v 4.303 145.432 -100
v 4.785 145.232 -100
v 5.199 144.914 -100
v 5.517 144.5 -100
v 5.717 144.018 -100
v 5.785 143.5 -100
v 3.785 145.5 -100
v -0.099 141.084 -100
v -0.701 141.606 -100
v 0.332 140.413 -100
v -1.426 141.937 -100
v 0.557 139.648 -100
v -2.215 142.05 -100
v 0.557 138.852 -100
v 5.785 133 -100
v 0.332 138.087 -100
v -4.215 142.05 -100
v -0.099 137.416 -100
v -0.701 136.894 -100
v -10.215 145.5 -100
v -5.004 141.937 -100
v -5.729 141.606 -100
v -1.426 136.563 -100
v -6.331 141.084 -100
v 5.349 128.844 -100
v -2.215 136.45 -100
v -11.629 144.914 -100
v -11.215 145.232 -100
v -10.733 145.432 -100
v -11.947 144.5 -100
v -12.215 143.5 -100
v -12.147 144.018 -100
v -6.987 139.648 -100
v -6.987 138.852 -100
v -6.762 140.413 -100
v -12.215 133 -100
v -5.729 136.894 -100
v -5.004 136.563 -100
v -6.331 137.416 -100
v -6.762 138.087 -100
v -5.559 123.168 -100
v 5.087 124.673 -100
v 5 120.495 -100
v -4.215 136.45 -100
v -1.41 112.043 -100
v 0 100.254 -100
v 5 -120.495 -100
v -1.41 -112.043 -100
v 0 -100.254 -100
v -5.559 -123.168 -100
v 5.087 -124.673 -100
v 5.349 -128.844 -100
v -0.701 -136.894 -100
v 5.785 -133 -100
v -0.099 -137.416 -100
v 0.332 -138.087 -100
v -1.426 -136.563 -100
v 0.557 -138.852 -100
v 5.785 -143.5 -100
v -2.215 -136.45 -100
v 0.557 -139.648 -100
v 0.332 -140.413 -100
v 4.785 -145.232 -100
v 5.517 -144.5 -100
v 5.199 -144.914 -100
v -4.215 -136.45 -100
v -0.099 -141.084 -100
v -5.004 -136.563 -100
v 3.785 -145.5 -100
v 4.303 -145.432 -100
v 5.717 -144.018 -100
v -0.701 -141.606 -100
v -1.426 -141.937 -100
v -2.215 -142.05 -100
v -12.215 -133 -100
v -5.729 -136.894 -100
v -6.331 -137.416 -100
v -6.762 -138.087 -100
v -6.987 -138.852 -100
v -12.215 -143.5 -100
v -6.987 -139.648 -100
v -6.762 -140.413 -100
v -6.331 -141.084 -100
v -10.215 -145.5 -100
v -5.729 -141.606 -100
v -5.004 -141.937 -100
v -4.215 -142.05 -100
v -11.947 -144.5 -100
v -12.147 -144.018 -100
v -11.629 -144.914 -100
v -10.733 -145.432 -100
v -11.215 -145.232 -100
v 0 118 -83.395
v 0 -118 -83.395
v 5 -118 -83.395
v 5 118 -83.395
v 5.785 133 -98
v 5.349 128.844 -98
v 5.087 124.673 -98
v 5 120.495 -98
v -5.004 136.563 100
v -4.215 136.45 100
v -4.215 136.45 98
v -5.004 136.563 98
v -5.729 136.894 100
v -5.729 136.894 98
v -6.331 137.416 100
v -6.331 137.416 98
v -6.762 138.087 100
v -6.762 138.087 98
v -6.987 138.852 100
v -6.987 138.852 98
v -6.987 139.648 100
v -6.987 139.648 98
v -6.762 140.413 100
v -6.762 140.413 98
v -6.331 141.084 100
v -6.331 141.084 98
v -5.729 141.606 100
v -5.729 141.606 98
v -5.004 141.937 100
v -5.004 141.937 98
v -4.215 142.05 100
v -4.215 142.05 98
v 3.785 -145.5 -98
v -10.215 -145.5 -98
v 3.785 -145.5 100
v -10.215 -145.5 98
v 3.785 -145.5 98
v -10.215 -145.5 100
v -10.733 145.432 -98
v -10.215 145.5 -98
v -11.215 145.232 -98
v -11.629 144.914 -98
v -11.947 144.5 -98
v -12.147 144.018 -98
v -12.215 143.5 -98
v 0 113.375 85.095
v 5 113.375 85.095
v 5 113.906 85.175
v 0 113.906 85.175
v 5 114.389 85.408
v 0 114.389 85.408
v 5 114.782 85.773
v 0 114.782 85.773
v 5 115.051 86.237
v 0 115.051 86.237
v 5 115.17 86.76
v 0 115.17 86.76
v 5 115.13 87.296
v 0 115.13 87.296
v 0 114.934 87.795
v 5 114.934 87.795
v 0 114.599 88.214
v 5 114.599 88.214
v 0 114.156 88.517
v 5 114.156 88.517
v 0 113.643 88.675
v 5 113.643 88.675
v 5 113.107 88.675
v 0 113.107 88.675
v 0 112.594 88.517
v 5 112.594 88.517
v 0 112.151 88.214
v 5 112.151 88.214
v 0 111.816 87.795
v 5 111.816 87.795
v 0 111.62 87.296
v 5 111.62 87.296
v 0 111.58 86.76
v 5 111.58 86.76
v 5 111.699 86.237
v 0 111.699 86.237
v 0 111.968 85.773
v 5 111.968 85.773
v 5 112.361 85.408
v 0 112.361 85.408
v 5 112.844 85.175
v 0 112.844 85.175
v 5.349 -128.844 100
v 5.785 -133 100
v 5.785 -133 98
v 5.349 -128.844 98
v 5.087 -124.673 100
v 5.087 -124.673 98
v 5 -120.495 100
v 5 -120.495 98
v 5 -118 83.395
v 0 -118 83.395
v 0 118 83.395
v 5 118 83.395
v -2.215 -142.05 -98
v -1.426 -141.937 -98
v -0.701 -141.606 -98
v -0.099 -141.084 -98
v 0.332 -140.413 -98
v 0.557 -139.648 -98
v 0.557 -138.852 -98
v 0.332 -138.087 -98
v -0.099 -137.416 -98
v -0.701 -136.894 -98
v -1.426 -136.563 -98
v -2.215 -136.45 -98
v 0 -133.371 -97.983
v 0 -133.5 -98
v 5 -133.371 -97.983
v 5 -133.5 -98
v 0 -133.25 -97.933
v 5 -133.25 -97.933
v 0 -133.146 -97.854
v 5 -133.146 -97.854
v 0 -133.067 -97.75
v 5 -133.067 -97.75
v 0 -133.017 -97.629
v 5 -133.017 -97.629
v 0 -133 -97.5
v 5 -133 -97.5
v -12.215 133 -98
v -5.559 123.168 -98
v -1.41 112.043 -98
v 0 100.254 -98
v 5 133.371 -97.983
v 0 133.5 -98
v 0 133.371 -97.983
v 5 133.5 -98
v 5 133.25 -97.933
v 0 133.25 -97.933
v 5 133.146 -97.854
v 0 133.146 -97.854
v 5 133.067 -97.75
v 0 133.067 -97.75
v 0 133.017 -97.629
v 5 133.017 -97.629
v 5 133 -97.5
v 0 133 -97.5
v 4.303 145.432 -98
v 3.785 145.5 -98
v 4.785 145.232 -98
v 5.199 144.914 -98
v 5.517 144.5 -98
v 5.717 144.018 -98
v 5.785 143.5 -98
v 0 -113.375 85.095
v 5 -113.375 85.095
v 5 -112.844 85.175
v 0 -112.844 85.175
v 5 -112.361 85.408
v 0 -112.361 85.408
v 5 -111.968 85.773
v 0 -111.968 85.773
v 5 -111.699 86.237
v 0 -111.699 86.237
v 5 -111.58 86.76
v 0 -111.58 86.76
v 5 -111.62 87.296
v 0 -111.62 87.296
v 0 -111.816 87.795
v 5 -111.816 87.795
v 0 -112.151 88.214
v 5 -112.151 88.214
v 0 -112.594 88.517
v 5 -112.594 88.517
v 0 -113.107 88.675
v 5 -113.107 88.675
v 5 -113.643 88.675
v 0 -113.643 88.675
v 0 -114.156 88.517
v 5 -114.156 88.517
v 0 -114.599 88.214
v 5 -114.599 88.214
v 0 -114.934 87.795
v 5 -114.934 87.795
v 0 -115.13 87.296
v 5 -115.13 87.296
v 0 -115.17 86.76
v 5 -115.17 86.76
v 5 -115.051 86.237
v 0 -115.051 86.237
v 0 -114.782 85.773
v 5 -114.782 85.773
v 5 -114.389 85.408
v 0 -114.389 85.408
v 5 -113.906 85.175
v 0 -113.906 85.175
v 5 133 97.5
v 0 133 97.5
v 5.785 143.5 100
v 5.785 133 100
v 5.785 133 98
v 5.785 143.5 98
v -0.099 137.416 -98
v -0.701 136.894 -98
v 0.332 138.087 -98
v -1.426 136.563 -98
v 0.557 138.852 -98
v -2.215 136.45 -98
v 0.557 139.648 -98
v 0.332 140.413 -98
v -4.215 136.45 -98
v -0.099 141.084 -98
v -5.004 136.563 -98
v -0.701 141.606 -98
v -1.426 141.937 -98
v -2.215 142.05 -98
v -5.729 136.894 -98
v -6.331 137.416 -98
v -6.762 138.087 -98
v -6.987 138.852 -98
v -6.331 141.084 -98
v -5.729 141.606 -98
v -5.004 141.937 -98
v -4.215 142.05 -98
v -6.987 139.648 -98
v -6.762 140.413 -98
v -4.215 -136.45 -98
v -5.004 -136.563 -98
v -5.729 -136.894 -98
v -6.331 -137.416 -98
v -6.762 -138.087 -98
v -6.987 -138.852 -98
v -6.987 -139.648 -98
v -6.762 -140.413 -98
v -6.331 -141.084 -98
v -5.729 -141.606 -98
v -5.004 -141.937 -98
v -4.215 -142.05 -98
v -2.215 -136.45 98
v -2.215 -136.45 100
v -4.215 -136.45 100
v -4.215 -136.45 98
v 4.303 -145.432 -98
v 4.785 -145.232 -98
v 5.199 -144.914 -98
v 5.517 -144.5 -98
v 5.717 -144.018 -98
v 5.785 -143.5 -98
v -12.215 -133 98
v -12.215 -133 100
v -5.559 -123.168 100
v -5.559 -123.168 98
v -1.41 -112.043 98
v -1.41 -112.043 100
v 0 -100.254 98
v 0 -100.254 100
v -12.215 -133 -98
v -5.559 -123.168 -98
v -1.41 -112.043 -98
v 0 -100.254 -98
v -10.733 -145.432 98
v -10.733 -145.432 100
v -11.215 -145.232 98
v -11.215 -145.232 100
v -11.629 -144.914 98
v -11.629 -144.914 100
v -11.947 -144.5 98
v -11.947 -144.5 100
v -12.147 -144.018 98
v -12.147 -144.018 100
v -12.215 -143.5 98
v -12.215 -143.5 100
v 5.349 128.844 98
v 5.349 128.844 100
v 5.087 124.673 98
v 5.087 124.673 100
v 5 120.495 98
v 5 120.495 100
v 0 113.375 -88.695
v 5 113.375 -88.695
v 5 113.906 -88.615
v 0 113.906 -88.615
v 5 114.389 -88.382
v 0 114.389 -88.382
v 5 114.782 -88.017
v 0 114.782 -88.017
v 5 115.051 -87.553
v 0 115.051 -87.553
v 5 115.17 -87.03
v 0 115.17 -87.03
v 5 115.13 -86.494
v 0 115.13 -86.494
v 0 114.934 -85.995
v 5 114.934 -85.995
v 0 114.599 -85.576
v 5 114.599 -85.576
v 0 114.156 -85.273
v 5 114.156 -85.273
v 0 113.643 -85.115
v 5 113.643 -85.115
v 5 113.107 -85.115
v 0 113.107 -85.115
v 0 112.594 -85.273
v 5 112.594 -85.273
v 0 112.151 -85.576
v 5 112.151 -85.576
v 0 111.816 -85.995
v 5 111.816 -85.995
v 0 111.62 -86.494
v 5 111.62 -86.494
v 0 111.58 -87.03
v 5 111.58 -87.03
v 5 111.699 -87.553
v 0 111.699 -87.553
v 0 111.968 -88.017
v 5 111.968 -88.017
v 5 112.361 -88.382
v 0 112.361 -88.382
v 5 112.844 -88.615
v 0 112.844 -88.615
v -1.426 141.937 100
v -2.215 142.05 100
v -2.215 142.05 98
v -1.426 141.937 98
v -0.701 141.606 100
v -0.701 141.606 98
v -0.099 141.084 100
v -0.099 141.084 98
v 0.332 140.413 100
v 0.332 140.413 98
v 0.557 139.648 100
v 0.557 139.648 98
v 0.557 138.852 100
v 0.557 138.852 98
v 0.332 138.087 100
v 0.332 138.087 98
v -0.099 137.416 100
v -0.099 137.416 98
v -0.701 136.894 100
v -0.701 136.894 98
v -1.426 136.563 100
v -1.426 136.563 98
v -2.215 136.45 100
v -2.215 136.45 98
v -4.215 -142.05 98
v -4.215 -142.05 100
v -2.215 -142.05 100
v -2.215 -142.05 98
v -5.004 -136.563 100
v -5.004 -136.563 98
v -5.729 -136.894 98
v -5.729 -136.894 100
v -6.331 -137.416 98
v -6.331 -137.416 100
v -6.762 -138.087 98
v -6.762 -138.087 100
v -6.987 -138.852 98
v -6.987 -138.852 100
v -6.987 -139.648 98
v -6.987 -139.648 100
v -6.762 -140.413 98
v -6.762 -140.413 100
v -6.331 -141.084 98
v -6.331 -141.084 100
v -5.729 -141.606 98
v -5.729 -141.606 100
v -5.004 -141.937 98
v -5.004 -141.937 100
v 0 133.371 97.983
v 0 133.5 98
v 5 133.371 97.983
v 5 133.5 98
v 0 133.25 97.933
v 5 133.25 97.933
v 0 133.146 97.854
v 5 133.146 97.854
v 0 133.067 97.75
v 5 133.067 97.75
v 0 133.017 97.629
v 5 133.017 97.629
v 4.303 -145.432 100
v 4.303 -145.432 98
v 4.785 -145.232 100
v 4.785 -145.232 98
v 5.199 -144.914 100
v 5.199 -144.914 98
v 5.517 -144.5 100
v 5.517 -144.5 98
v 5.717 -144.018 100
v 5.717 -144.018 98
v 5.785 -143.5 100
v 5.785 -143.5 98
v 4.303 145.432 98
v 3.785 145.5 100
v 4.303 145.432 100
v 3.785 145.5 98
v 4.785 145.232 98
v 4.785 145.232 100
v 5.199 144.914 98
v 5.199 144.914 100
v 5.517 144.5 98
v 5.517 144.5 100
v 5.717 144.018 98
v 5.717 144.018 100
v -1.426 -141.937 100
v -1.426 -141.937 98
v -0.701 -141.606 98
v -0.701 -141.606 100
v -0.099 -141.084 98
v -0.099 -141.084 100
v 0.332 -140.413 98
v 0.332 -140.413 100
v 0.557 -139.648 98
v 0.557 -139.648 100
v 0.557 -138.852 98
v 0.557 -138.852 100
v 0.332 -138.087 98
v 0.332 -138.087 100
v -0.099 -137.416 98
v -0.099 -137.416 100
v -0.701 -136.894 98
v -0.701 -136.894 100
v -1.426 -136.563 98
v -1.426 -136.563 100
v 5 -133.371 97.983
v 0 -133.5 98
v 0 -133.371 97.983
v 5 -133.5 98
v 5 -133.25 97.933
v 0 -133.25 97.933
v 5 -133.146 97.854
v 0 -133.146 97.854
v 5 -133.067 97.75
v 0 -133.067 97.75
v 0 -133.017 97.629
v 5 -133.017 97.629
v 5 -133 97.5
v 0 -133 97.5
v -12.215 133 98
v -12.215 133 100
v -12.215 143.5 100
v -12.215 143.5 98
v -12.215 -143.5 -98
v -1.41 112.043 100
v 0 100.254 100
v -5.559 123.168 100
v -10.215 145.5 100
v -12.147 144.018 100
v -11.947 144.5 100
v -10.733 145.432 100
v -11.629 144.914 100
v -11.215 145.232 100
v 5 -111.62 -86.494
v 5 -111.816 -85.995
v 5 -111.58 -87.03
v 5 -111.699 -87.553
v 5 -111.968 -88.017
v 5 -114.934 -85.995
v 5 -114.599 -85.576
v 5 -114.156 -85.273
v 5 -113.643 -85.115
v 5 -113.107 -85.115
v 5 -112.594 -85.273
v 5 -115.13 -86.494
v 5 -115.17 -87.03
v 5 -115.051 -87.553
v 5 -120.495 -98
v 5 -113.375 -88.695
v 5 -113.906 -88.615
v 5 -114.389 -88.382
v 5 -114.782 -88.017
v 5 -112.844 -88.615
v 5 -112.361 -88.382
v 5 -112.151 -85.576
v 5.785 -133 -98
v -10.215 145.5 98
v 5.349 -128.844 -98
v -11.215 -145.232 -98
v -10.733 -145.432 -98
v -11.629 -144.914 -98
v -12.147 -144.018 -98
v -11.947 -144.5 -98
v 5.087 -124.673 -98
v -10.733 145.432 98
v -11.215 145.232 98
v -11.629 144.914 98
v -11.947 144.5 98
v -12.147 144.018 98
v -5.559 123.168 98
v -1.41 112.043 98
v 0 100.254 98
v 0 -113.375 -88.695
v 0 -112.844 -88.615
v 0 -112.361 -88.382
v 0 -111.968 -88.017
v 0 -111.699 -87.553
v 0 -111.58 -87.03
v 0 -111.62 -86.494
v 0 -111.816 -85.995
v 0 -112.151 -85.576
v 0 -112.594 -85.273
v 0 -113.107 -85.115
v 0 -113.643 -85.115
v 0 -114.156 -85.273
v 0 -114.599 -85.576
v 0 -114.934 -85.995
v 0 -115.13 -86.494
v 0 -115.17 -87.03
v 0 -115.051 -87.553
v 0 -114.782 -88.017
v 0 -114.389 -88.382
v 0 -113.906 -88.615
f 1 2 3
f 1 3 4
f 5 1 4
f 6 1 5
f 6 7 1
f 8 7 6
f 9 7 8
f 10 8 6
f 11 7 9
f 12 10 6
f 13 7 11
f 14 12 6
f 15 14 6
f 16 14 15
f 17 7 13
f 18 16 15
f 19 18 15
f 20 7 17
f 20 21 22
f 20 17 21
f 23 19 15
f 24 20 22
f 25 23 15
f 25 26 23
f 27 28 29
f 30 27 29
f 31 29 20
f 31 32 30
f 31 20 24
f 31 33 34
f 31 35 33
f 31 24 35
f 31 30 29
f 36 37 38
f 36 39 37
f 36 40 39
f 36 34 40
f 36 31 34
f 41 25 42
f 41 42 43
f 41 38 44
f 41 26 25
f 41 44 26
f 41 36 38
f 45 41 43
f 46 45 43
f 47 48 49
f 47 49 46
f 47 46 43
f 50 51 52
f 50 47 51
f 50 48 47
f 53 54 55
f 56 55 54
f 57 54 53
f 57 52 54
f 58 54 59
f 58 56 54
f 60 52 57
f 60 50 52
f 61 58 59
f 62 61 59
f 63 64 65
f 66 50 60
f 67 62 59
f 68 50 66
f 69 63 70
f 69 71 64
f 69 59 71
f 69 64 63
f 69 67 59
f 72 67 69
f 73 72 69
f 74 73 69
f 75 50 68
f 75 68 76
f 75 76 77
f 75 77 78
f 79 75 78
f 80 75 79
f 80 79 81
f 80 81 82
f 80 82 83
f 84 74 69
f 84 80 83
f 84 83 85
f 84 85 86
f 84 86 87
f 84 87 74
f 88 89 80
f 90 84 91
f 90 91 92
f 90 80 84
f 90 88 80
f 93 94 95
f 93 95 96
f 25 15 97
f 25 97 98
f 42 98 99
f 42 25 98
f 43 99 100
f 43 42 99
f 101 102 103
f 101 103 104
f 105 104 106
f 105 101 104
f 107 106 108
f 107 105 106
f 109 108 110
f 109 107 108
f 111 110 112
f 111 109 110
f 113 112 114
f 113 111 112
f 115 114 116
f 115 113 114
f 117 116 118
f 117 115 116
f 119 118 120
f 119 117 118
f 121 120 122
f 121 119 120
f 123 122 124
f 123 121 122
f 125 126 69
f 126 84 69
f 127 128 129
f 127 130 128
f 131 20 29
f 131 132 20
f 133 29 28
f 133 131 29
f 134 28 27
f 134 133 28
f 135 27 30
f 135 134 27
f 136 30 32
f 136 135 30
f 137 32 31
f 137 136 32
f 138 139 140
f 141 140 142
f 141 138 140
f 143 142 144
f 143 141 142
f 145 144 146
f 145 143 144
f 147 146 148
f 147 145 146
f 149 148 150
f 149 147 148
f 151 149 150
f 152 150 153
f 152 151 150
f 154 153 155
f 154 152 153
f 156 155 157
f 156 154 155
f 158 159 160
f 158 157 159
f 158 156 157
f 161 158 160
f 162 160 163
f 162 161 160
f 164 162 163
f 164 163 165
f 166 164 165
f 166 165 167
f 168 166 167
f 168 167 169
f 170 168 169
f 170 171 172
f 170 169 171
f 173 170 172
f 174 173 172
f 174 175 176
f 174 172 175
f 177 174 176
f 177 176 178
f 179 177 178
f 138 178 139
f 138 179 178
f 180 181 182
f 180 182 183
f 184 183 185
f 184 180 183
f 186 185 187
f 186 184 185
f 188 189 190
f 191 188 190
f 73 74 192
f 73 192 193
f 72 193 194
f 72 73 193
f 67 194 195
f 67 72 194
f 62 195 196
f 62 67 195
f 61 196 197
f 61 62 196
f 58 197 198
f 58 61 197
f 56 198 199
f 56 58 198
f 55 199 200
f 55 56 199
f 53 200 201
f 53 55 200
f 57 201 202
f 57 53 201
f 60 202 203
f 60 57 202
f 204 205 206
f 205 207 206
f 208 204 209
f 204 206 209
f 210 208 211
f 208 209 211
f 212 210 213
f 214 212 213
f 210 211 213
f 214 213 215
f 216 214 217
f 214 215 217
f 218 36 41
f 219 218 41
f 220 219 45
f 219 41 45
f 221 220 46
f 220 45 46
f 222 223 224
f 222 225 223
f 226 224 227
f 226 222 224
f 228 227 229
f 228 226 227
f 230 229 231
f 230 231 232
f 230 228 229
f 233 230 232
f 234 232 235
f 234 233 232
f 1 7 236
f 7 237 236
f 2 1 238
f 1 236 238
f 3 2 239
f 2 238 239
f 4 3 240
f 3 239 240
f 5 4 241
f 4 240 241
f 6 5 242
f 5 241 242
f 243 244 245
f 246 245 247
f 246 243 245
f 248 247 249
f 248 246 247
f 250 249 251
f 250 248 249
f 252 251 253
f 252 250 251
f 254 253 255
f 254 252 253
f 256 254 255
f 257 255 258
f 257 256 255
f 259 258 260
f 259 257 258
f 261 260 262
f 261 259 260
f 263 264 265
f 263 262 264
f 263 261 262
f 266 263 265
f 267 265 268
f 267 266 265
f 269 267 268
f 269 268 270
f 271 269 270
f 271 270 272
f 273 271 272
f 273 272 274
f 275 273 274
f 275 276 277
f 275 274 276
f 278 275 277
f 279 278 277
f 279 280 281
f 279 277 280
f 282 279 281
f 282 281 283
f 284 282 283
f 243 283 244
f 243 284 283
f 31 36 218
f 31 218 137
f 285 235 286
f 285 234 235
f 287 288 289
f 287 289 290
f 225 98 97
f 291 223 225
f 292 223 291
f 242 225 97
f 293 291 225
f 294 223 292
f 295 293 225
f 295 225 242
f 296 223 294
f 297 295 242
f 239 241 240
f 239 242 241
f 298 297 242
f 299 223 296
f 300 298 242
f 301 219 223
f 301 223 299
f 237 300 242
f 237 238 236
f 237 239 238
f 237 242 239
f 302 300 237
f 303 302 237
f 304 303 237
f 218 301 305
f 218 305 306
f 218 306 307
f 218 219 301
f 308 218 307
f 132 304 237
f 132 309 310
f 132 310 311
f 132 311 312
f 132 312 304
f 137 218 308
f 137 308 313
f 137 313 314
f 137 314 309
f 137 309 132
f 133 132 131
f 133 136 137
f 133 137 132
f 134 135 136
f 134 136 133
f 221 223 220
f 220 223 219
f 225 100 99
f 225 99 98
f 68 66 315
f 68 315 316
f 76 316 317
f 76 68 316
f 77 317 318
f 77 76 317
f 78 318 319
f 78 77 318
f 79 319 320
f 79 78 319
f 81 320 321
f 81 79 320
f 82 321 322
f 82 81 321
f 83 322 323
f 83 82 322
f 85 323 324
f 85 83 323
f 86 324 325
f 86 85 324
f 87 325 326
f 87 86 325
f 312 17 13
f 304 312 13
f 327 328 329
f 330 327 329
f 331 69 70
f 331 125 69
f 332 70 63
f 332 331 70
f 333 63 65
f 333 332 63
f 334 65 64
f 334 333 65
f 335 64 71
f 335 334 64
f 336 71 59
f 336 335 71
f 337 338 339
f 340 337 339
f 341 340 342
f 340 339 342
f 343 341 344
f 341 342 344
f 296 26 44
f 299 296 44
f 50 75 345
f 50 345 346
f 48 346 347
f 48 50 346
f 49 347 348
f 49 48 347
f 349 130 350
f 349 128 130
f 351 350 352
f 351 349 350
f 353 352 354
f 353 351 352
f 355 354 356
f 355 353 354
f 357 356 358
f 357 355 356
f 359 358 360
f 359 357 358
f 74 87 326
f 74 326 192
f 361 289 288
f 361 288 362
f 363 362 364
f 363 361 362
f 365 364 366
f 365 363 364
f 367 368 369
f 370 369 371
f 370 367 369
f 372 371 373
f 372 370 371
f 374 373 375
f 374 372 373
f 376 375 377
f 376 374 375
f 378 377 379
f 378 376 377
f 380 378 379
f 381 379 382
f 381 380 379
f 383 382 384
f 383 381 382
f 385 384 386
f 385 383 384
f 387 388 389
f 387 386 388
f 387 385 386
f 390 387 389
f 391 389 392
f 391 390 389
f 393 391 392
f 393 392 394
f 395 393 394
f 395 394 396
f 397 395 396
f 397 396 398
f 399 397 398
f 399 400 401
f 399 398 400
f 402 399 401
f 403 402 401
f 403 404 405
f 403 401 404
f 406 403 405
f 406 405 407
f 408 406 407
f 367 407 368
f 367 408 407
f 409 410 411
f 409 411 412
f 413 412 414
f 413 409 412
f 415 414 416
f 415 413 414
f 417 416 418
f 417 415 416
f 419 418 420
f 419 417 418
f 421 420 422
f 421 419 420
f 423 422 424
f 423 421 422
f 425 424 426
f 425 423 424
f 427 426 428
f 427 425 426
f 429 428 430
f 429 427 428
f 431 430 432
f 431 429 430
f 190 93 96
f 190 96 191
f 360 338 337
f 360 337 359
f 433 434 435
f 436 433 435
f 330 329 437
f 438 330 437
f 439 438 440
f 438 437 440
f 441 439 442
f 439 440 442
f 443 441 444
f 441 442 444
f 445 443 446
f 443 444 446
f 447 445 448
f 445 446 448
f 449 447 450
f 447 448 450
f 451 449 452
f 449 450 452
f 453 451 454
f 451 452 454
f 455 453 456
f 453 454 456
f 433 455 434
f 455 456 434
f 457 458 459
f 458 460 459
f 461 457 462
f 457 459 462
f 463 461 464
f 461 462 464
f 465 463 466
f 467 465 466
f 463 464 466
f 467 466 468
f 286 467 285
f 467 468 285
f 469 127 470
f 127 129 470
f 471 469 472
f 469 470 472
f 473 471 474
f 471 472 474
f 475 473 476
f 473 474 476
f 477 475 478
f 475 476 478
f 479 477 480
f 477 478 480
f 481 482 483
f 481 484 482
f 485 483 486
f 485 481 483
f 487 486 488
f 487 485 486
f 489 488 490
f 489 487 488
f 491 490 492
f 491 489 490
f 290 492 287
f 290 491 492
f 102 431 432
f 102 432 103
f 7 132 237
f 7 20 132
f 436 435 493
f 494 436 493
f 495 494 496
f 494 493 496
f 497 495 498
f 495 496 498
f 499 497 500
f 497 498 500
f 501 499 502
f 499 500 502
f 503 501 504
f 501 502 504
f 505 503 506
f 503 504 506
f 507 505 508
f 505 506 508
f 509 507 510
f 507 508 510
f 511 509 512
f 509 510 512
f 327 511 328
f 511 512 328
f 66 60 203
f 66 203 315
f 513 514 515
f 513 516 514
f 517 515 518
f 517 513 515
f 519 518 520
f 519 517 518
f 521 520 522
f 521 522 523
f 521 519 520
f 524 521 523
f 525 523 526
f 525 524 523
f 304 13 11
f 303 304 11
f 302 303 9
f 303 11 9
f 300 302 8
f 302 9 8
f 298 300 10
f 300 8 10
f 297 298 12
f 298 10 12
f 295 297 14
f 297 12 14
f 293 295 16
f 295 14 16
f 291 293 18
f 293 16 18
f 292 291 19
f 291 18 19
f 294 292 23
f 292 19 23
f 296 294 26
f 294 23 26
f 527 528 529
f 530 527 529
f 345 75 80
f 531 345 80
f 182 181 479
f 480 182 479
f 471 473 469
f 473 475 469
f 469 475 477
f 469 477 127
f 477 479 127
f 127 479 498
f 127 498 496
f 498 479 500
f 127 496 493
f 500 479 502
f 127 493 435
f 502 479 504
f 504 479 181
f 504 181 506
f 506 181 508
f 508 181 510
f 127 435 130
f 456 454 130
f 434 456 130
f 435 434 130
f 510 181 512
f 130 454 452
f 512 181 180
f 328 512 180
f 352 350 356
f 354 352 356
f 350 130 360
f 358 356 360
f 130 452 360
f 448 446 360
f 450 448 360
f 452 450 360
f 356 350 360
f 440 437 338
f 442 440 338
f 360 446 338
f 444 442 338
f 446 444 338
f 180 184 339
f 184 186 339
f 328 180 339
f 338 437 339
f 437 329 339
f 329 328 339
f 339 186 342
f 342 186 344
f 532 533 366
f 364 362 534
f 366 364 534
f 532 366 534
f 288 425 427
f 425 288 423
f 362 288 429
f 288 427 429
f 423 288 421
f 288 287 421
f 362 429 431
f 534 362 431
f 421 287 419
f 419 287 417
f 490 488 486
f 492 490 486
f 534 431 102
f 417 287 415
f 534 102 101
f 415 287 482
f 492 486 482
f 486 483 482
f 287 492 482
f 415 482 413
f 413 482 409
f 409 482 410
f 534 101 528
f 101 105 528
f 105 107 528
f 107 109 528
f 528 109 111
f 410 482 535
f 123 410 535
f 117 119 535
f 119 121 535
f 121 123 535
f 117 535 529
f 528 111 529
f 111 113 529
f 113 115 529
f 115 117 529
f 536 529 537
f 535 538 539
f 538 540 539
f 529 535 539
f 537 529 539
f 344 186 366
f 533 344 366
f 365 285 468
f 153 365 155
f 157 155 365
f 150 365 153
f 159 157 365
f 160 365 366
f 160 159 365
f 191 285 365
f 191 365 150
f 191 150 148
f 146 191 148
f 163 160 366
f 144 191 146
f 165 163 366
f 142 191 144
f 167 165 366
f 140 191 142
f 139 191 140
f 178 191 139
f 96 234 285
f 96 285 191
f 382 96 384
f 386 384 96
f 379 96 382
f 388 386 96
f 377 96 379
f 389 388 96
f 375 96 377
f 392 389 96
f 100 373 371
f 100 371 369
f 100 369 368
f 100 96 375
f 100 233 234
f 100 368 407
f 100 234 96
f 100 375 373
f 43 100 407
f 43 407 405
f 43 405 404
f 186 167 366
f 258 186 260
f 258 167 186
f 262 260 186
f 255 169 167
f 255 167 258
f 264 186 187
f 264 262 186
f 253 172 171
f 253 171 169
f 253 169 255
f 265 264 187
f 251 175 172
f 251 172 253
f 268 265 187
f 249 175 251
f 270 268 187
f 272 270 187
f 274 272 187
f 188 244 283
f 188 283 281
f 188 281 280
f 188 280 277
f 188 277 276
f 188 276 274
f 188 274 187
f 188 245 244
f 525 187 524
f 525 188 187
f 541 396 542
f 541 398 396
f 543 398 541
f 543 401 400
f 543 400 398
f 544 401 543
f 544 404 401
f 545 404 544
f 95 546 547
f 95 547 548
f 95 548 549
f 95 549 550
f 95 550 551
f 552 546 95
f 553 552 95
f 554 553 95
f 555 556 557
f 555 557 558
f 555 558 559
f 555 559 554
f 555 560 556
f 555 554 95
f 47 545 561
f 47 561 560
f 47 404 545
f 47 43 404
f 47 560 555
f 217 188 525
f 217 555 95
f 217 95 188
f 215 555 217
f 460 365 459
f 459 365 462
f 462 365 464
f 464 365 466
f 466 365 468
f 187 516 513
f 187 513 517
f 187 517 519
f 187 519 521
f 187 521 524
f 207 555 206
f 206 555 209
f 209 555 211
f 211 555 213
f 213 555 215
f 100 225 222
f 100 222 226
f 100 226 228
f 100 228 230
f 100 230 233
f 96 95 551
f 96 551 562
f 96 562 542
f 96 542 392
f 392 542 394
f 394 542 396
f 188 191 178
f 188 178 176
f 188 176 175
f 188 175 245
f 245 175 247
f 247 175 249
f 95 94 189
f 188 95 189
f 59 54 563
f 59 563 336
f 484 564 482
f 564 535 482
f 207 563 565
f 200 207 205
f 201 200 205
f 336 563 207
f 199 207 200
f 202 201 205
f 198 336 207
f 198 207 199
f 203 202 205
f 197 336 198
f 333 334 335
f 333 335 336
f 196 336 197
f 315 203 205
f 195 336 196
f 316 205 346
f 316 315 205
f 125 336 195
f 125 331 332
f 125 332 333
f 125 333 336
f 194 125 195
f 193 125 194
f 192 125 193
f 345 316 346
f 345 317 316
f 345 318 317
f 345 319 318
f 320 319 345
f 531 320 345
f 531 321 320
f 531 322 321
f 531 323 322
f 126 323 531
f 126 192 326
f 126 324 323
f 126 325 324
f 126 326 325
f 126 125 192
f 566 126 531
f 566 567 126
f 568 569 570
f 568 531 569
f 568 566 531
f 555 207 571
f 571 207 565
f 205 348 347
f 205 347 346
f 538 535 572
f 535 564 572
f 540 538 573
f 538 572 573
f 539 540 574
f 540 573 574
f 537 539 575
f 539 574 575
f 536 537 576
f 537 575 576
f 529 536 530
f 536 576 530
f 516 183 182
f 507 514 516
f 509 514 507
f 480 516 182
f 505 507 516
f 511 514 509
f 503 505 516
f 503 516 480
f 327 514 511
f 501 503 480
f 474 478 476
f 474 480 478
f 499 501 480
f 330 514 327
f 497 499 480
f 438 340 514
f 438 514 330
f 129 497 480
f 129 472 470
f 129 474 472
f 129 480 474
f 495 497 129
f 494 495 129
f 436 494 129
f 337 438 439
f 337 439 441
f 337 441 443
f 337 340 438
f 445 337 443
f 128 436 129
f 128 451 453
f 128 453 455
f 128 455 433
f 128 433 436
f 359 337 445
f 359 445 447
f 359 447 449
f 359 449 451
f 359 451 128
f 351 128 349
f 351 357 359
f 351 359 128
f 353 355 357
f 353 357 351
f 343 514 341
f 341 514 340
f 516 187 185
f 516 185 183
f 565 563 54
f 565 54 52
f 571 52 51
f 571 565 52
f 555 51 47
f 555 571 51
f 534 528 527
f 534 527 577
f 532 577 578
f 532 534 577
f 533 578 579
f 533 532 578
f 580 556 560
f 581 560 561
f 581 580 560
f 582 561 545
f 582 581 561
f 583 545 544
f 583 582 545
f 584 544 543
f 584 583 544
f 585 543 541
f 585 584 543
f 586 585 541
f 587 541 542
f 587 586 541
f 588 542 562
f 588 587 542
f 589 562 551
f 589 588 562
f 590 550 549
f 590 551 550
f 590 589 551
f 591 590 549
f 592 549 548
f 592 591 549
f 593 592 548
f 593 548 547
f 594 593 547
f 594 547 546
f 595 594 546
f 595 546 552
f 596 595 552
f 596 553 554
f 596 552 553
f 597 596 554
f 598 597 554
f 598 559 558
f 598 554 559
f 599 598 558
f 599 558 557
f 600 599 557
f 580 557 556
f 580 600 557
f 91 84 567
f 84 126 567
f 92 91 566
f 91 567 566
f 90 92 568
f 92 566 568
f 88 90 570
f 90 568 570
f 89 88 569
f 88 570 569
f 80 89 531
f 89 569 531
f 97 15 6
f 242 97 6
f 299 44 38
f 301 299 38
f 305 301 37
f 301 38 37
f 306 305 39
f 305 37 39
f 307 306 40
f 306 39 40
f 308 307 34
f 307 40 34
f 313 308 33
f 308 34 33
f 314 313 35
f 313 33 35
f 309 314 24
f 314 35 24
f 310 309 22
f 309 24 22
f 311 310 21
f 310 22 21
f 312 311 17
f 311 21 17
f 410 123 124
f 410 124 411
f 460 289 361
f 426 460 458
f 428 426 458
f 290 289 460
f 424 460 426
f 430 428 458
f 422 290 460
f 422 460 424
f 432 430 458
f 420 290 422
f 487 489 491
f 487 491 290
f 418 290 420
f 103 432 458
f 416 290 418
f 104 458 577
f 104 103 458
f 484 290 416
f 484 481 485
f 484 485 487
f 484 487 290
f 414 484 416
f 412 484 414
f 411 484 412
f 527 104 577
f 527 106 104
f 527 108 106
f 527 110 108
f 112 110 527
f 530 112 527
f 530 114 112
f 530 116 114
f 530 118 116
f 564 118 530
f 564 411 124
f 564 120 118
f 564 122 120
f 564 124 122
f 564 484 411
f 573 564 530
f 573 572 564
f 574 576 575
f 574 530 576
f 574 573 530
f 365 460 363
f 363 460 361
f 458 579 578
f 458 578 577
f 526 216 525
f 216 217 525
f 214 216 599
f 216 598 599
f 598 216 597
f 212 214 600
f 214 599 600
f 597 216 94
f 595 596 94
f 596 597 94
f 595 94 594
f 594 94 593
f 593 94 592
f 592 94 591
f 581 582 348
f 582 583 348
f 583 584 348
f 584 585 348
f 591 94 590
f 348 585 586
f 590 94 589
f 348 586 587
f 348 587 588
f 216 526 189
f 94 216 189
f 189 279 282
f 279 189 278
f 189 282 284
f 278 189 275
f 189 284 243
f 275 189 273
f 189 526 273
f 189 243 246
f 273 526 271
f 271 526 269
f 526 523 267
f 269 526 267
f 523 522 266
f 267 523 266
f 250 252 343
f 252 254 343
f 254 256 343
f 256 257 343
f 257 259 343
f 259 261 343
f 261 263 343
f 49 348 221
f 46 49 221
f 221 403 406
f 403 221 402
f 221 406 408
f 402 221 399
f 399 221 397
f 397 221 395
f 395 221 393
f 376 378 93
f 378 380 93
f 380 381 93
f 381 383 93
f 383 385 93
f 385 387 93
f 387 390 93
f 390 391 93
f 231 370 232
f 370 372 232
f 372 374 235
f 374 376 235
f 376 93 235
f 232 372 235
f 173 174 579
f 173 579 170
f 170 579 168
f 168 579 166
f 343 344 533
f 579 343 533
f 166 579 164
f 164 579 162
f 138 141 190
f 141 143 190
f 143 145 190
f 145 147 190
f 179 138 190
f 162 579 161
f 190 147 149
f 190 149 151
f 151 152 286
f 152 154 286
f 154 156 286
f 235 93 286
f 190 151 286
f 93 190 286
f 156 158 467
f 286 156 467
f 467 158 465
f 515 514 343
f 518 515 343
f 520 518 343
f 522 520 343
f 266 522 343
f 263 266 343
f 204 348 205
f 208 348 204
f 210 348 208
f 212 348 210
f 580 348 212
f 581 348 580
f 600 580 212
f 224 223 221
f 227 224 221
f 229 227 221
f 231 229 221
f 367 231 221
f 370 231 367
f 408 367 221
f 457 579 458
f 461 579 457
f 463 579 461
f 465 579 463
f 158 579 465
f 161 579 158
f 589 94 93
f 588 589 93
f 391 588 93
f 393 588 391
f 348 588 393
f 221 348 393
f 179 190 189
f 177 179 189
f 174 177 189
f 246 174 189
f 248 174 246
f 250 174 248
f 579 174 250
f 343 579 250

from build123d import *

# Parameters (mm, degrees)
SKETCH1_W           = 266
SKETCH1_H           = 7
SKETCH1_R           = 1.8
SKETCH1_W_2         = 15
SKETCH1_H_2         = 166.79
BOSS_EXTRUDE1_DEPTH = 5
SKETCH2_W           = 266
SKETCH2_H           = 9.605
BOSS_EXTRUDE2_DEPTH = 5
SKETCH3_W           = 17.215
SKETCH3_H           = 12.5
SKETCH3_W_2         = 0.785
BOSS_EXTRUDE3_DEPTH = 2
FILLET1_R           = 0.5
FILLET2_R           = 50
FILLET3_R           = 2
FILLET4_R           = 100


with BuildPart() as part:
    # Sketch1 → Boss-Extrude1 (new body)
    # profile 1 of 4: a face of its own
    with BuildSketch(Plane.YZ):
        with Locations((0, 86.895)):
            Rectangle(SKETCH1_W, SKETCH1_H)
        with Locations(Location((113.375, 86.895, 0), (0, 0, 270))):
            Circle(SKETCH1_R, mode=Mode.SUBTRACT)
        with Locations(Location((-113.375, 86.895, 0), (0, 0, 270))):
            Circle(SKETCH1_R, mode=Mode.SUBTRACT)
    # profile 2 of 4: a face of its own
    with BuildSketch(Plane.YZ):
        with Locations((125.5, 0)):
            Rectangle(SKETCH1_W_2, SKETCH1_H_2)
    # profile 3 of 4: a face of its own
    with BuildSketch(Plane.YZ):
        with Locations((-125.5, 0)):
            Rectangle(SKETCH1_W_2, SKETCH1_H_2)
    # profile 4 of 4: a face of its own
    with BuildSketch(Plane.YZ):
        with Locations((0, -86.895)):
            Rectangle(SKETCH1_W, SKETCH1_H)
        with Locations(Location((-113.375, -86.895, 0), (0, 0, 270))):
            Circle(SKETCH1_R, mode=Mode.SUBTRACT)
        with Locations(Location((113.375, -86.895, 0), (0, 0, 270))):
            Circle(SKETCH1_R, mode=Mode.SUBTRACT)
    extrude(amount=BOSS_EXTRUDE1_DEPTH)

    # Sketch2 → Boss-Extrude2 (add)
    with BuildSketch(Plane.YZ.offset(5)):
        with Locations((0, 95.1975)):
            Rectangle(SKETCH2_W, SKETCH2_H)
        with Locations((0, -95.1975)):
            Rectangle(SKETCH2_W, SKETCH2_H)
    extrude(amount=-BOSS_EXTRUDE2_DEPTH)

    # Sketch3 → Boss-Extrude3 (add)
    # profile 1 of 2: a face of its own
    with BuildSketch(Plane(origin=(0, 0, -100), x_dir=(1, 0, 0), z_dir=(0, 0, -1))):
        with Locations((-3.6075, 139.25)):
            Rectangle(SKETCH3_W, SKETCH3_H)
        with BuildLine():
            ThreePointArc((-4.215, 136.45), (-7.015, 139.25), (-4.215, 142.05))
            Line((-4.215, 142.05), (-2.215, 142.05))
            ThreePointArc((-2.215, 142.05), (0.585, 139.25), (-2.215, 136.45))
            Line((-2.215, 136.45), (-4.215, 136.45))
        make_face(mode=Mode.SUBTRACT)
    # profile 2 of 2: a face of its own
    with BuildSketch(Plane(origin=(0, 0, -100), x_dir=(1, 0, 0), z_dir=(0, 0, -1))):
        with Locations((5.3925, 139.25)):
            Rectangle(SKETCH3_W_2, SKETCH3_H)
    extrude(amount=-BOSS_EXTRUDE3_DEPTH)

    # Fillet1
    fillet1_edges = [part.edges().sort_by_distance(p)[0] for p in [
        (2.5, -133, -98),
    ]]
    fillet(fillet1_edges, radius=FILLET1_R)

    # Fillet2
    # the kernel refuses this fillet: 50 mm, written as the material it adds along each edge
    with BuildSketch(Plane(origin=(0, -133, -100), x_dir=(0, 1, 0), z_dir=(0, 0, 1))) as fillet2_piece_1:
        with BuildLine():
            CenterArc((32.745897071, 50), FILLET2_R, 229.086571868, 40.913428132)
            Line((0, 12.215), (0, 0))
            Line((0, 0), (32.745897071, 0))
        make_face()
    extrude(amount=2)

    # Fillet3
    fillet3_edges = [part.edges().sort_by_distance(p)[0] for p in [
        (-12.215, -145.5, -99),
        (5.785, -145.5, -99),
    ]]
    fillet(fillet3_edges, radius=FILLET3_R)

    # Mirror1: part across plane


with BuildPart() as part_1:
    add(part.part)
    add(part.part.mirror(Plane.XY))

    # Mirror2: part across plane


with BuildPart() as part_2:
    add(part_1.part)
    add(part_1.part.mirror(Plane.ZX))

    # Fillet4
    # the kernel refuses this fillet: 100 mm, written as the material it adds along each edge
    with BuildSketch(Plane(origin=(5, 133, 98), x_dir=(1, 0, 0), z_dir=(0, 0, 1)), Plane(origin=(5, 133, -100), x_dir=(1, 0, 0), z_dir=(0, 0, 1)), Plane(origin=(5, -133, -98), x_dir=(1, 0, 0), z_dir=(0, 0, -1)), Plane(origin=(5, -133, 100), x_dir=(1, 0, 0), z_dir=(0, 0, -1))) as fillet4_piece_1:
        with BuildLine():
            CenterArc((100, -12.505349855), FILLET4_R, 172.816154735, 7.183845265)
            Line((0, -12.505349855), (0, 0))
            Line((0, 0), (0.785, 0))
        make_face()
    extrude(amount=2)


solid = part_2.part
